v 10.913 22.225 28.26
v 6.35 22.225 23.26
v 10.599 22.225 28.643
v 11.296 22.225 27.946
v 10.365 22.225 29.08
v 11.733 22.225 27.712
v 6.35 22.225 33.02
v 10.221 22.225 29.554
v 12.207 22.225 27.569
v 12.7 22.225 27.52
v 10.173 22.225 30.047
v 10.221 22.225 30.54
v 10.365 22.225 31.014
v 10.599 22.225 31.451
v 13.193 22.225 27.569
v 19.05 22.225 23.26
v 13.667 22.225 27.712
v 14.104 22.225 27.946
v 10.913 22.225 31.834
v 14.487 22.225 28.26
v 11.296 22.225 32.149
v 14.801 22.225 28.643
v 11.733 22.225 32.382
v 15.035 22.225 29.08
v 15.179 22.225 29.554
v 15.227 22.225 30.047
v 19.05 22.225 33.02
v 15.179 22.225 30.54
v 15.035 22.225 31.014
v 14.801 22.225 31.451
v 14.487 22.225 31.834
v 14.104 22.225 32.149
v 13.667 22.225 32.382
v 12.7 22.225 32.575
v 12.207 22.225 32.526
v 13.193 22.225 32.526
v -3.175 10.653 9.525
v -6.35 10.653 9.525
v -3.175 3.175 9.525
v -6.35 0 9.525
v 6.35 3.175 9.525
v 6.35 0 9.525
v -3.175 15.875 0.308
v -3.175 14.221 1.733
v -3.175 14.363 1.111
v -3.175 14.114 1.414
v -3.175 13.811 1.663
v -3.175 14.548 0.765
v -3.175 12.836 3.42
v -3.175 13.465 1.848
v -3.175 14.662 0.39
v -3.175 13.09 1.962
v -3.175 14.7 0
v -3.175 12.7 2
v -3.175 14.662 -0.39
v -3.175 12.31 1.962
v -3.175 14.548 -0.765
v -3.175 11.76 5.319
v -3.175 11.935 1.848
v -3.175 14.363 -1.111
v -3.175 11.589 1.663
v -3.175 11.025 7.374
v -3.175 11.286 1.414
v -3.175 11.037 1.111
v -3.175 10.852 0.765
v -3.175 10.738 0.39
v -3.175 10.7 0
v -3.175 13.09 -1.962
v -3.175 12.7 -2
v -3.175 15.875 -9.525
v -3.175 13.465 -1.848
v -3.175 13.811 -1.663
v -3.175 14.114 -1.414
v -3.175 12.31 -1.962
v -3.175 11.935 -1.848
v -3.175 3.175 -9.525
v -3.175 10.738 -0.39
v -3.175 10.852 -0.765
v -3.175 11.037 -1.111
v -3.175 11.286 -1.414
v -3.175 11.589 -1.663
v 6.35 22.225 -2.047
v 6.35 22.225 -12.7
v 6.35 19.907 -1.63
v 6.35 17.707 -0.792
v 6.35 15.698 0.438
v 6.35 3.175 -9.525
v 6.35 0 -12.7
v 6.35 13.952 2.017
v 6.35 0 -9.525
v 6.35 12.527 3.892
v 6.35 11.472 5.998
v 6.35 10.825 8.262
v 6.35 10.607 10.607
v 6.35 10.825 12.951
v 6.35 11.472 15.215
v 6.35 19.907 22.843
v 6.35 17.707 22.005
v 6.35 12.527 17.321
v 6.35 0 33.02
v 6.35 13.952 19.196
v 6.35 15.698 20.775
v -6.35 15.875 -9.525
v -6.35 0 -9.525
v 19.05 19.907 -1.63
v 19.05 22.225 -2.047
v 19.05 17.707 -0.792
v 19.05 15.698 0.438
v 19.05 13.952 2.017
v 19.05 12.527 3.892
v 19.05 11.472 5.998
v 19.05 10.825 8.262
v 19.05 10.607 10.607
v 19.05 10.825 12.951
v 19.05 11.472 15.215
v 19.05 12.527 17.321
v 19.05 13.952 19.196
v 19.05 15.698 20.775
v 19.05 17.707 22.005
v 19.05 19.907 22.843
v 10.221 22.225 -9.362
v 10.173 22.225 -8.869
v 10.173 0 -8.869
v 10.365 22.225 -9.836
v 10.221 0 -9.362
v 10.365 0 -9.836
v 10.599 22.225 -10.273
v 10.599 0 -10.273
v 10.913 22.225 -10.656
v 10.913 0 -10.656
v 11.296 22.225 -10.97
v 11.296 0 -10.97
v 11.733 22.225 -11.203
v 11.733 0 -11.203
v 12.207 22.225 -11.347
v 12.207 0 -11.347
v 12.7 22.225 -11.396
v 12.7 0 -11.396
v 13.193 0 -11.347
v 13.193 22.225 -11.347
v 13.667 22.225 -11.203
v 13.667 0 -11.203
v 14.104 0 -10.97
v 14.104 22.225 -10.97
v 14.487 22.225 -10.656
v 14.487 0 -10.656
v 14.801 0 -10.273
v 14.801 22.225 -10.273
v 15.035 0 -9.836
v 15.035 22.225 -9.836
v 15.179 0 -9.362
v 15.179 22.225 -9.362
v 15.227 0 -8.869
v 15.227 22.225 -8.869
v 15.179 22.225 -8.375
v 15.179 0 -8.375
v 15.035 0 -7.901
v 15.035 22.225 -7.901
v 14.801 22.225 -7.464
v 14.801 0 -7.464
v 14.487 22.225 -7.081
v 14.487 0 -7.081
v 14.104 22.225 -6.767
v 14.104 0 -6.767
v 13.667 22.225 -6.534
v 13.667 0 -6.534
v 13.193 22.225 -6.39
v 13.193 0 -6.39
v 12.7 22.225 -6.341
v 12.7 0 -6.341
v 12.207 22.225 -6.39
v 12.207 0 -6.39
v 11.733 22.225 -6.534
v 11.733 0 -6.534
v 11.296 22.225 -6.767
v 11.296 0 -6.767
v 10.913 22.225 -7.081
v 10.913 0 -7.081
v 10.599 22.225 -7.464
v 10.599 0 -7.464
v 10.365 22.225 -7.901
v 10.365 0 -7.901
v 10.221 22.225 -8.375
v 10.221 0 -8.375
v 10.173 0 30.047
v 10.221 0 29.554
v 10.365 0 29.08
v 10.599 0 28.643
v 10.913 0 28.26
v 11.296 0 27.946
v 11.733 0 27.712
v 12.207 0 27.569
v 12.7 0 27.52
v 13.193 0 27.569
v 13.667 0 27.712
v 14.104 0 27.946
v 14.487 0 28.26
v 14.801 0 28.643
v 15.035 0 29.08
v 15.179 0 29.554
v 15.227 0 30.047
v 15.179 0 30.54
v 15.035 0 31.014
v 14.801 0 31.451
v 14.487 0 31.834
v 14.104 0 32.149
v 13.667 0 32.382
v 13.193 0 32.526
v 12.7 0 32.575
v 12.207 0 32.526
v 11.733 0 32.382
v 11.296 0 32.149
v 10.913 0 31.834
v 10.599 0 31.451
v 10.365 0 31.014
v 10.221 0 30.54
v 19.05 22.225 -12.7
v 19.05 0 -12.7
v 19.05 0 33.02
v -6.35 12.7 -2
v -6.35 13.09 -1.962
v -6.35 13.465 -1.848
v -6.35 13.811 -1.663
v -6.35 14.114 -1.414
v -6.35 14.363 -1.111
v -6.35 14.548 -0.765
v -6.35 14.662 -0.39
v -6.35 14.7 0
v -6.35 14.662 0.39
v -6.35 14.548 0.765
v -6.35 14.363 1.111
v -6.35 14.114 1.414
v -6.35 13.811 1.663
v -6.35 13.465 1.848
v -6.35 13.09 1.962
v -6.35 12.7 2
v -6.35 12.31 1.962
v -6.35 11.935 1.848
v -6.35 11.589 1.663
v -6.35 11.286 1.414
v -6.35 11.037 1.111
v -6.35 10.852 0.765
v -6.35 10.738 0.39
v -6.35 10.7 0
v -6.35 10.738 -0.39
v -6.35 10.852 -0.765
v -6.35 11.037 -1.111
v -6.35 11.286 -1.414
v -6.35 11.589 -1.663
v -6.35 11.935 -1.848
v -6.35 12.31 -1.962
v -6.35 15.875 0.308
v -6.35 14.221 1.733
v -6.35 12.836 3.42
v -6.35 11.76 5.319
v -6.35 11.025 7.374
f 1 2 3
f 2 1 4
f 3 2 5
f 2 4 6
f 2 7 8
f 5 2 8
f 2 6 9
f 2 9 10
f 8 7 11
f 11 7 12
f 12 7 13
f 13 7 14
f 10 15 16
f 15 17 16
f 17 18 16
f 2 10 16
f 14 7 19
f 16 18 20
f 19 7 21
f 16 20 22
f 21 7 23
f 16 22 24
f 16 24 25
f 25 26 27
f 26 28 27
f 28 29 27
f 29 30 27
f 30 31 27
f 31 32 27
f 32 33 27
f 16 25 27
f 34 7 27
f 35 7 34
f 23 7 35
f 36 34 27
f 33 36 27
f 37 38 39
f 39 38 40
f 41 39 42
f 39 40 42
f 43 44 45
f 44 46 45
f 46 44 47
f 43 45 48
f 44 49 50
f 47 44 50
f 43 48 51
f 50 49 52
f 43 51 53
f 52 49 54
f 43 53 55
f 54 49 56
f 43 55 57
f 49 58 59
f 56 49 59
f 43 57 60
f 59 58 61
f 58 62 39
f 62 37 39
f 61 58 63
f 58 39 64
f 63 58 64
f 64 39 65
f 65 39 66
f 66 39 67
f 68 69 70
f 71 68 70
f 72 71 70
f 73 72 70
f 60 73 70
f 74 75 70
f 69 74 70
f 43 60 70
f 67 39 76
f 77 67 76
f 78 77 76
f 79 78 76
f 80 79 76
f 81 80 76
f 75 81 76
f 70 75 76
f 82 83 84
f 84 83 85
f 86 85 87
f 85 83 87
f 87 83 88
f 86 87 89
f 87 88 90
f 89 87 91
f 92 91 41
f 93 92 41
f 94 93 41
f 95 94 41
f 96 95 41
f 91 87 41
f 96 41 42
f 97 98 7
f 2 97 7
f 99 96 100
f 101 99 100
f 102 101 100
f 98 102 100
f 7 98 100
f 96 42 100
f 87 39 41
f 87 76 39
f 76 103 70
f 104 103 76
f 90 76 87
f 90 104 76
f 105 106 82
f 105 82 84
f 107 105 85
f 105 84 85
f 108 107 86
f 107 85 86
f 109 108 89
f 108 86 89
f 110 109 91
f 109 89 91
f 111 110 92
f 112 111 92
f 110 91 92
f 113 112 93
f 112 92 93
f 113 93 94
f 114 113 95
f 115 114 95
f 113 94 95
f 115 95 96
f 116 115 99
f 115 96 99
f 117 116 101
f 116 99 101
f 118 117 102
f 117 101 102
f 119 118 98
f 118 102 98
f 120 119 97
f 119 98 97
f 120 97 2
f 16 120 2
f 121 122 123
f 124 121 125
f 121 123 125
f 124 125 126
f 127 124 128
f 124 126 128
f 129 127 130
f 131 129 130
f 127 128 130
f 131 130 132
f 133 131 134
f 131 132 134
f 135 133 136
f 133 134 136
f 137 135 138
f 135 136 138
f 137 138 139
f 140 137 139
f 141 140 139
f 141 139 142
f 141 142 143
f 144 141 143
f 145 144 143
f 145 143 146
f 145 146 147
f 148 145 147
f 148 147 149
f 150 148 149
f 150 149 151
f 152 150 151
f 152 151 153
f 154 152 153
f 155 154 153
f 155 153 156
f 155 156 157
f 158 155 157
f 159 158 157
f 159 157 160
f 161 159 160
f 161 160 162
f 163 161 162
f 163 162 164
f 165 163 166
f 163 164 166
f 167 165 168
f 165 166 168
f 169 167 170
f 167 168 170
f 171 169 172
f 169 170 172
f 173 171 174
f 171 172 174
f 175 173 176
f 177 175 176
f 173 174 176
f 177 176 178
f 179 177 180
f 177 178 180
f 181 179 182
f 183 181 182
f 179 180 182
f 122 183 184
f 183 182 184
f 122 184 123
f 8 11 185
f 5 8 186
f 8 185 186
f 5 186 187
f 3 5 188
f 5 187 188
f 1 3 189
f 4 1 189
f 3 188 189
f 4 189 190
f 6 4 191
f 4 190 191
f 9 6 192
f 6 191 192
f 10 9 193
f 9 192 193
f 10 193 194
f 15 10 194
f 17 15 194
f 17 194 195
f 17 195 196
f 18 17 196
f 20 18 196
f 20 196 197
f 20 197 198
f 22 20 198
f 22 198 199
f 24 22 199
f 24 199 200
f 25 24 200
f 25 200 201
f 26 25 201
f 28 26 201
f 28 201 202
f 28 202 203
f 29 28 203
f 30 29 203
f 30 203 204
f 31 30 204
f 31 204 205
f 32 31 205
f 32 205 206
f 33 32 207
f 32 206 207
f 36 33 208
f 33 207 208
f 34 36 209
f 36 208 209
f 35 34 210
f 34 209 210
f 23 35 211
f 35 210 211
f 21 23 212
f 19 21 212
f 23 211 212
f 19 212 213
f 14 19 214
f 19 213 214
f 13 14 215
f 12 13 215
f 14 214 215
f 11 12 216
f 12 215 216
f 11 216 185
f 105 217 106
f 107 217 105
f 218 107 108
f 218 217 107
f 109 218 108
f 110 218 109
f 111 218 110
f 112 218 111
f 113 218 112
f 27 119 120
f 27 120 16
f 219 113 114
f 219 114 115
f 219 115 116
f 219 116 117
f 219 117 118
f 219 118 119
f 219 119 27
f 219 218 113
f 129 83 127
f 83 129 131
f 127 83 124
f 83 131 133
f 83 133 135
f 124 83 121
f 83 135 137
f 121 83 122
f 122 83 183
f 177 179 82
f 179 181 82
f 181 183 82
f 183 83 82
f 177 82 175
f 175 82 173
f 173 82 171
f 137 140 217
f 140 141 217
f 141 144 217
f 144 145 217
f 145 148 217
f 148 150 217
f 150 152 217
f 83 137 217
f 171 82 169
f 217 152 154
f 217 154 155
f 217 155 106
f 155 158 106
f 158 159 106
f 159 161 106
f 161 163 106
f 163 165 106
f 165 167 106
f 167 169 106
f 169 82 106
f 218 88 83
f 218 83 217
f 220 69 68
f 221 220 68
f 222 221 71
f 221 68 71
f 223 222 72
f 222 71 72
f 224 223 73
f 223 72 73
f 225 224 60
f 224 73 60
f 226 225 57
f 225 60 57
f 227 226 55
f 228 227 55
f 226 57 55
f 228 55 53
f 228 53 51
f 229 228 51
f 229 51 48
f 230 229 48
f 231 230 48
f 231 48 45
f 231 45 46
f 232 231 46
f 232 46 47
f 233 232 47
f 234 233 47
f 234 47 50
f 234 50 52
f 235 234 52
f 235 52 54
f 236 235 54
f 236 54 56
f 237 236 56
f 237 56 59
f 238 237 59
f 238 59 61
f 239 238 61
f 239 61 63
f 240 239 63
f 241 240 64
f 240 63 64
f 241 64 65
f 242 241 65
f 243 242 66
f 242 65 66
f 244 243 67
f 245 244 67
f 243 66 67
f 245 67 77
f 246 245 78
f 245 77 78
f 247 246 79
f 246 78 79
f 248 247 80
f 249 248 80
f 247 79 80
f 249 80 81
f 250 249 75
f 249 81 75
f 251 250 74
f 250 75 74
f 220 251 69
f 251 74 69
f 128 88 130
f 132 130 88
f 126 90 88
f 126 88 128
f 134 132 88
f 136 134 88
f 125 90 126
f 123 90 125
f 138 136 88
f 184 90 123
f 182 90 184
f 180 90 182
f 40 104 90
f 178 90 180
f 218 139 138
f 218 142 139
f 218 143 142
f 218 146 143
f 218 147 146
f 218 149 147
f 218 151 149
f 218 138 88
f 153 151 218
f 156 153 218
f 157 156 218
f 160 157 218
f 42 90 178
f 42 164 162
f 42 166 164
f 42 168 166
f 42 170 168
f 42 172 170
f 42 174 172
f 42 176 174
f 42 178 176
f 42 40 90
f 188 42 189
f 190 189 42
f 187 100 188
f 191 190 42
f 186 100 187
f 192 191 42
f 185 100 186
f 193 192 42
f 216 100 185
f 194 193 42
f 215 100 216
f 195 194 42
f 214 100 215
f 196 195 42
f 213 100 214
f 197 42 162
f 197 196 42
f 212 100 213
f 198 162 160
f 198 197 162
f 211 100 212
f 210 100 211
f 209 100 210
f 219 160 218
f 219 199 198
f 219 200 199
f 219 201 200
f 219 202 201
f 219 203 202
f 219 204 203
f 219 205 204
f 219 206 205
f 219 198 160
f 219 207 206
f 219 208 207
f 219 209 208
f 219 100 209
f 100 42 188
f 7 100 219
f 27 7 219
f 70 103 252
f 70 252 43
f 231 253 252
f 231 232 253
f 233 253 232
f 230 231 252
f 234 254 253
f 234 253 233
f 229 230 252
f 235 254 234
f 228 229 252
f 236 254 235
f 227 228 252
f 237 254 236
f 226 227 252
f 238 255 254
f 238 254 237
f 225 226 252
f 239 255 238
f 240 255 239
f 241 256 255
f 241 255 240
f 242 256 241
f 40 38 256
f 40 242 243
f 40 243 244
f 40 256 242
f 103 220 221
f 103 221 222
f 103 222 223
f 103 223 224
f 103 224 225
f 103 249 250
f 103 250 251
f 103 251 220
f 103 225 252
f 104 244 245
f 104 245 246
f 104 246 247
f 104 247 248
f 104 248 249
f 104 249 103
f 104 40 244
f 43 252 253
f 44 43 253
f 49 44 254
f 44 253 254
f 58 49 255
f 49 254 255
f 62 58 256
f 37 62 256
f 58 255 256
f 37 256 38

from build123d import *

# Parameters (mm, degrees)
SKETCH1_W                      = 9.525
SKETCH1_H                      = 19.05
SKETCH1_W_2                    = 3.175
BOSS_EXTRUDE1_DEPTH            = 3.175
BOSS_EXTRUDE2_START            = 3.175
SKETCH1_3_W                    = 3.175
SKETCH1_3_H                    = 19.05
BOSS_EXTRUDE2_DEPTH            = 12.7
SKETCH2_R                      = 2
CUT_EXTRUDE1_DEPTH             = 21.819867315
SKETCH4_W                      = 12.7
SKETCH4_H                      = 45.72
BOSS_EXTRUDE3_DEPTH            = 22.225
SKETCH3_R                      = 12.7
CUT_EXTRUDE2_DEPTH             = 48.21685107
F_8_0_199_DIAMETER_HOLE1_D     = 5.0546
F_8_0_199_DIAMETER_HOLE1_DEPTH = 61.468
F_8_0_199_DIAMETER_HOLE1_TIP   = 1.518555042


with BuildPart() as part:
    # Sketch1 → Boss-Extrude1 (new body)
    with BuildSketch(Plane(origin=(0, 0, 0), x_dir=(1, 0, 0), z_dir=(0, 1, 0))):
        with Locations((1.5875, 0)):
            Rectangle(SKETCH1_W, SKETCH1_H)
        with Locations((-4.7625, 0)):
            Rectangle(SKETCH1_W_2, SKETCH1_H)
    extrude(amount=BOSS_EXTRUDE1_DEPTH)

    # Sketch1<3> → Boss-Extrude2 (add)
    with BuildSketch(Plane(origin=(0, 0, 0), x_dir=(1, 0, 0), z_dir=(0, 1, 0)).offset(BOSS_EXTRUDE2_START)):
        with Locations((-4.7625, 0)):
            Rectangle(SKETCH1_3_W, SKETCH1_3_H)
    extrude(amount=BOSS_EXTRUDE2_DEPTH)

    # Sketch2 → Cut-Extrude1 (cut, through all)
    with BuildSketch(Plane(origin=(-3.175, 0, 0), x_dir=(0, 0, -1), z_dir=(1, 0, 0))):
        with Locations((0, 12.7)):
            Circle(SKETCH2_R)
    extrude(amount=-CUT_EXTRUDE1_DEPTH, mode=Mode.SUBTRACT)

    # Sketch4 → Boss-Extrude3 (add)
    with BuildSketch(Plane.XZ):
        with Locations((12.7, 10.16)):
            Rectangle(SKETCH4_W, SKETCH4_H)
    extrude(amount=-BOSS_EXTRUDE3_DEPTH)

    # Sketch3 → Cut-Extrude2 (cut, through all)
    with BuildSketch(Plane.ZY.offset(6.35)):
        with Locations((10.606601718, 23.306601718)):
            Circle(SKETCH3_R)
    extrude(amount=-CUT_EXTRUDE2_DEPTH, mode=Mode.SUBTRACT)

    # #8 (0.199) Diameter Hole1
    with Locations(Plane(origin=(0, 22.225, 0), x_dir=(1, 0, 0), z_dir=(0, 1, 0))):
        with Locations((12.7, 8.868531542), (12.7, -30.047302209)):
            Hole(F_8_0_199_DIAMETER_HOLE1_D / 2, depth=F_8_0_199_DIAMETER_HOLE1_DEPTH)
            with Locations((0, 0, -(F_8_0_199_DIAMETER_HOLE1_DEPTH + F_8_0_199_DIAMETER_HOLE1_TIP / 2))):  # 118° drill point
                Cone(0, F_8_0_199_DIAMETER_HOLE1_D / 2, F_8_0_199_DIAMETER_HOLE1_TIP, mode=Mode.SUBTRACT)


solid = part.part
